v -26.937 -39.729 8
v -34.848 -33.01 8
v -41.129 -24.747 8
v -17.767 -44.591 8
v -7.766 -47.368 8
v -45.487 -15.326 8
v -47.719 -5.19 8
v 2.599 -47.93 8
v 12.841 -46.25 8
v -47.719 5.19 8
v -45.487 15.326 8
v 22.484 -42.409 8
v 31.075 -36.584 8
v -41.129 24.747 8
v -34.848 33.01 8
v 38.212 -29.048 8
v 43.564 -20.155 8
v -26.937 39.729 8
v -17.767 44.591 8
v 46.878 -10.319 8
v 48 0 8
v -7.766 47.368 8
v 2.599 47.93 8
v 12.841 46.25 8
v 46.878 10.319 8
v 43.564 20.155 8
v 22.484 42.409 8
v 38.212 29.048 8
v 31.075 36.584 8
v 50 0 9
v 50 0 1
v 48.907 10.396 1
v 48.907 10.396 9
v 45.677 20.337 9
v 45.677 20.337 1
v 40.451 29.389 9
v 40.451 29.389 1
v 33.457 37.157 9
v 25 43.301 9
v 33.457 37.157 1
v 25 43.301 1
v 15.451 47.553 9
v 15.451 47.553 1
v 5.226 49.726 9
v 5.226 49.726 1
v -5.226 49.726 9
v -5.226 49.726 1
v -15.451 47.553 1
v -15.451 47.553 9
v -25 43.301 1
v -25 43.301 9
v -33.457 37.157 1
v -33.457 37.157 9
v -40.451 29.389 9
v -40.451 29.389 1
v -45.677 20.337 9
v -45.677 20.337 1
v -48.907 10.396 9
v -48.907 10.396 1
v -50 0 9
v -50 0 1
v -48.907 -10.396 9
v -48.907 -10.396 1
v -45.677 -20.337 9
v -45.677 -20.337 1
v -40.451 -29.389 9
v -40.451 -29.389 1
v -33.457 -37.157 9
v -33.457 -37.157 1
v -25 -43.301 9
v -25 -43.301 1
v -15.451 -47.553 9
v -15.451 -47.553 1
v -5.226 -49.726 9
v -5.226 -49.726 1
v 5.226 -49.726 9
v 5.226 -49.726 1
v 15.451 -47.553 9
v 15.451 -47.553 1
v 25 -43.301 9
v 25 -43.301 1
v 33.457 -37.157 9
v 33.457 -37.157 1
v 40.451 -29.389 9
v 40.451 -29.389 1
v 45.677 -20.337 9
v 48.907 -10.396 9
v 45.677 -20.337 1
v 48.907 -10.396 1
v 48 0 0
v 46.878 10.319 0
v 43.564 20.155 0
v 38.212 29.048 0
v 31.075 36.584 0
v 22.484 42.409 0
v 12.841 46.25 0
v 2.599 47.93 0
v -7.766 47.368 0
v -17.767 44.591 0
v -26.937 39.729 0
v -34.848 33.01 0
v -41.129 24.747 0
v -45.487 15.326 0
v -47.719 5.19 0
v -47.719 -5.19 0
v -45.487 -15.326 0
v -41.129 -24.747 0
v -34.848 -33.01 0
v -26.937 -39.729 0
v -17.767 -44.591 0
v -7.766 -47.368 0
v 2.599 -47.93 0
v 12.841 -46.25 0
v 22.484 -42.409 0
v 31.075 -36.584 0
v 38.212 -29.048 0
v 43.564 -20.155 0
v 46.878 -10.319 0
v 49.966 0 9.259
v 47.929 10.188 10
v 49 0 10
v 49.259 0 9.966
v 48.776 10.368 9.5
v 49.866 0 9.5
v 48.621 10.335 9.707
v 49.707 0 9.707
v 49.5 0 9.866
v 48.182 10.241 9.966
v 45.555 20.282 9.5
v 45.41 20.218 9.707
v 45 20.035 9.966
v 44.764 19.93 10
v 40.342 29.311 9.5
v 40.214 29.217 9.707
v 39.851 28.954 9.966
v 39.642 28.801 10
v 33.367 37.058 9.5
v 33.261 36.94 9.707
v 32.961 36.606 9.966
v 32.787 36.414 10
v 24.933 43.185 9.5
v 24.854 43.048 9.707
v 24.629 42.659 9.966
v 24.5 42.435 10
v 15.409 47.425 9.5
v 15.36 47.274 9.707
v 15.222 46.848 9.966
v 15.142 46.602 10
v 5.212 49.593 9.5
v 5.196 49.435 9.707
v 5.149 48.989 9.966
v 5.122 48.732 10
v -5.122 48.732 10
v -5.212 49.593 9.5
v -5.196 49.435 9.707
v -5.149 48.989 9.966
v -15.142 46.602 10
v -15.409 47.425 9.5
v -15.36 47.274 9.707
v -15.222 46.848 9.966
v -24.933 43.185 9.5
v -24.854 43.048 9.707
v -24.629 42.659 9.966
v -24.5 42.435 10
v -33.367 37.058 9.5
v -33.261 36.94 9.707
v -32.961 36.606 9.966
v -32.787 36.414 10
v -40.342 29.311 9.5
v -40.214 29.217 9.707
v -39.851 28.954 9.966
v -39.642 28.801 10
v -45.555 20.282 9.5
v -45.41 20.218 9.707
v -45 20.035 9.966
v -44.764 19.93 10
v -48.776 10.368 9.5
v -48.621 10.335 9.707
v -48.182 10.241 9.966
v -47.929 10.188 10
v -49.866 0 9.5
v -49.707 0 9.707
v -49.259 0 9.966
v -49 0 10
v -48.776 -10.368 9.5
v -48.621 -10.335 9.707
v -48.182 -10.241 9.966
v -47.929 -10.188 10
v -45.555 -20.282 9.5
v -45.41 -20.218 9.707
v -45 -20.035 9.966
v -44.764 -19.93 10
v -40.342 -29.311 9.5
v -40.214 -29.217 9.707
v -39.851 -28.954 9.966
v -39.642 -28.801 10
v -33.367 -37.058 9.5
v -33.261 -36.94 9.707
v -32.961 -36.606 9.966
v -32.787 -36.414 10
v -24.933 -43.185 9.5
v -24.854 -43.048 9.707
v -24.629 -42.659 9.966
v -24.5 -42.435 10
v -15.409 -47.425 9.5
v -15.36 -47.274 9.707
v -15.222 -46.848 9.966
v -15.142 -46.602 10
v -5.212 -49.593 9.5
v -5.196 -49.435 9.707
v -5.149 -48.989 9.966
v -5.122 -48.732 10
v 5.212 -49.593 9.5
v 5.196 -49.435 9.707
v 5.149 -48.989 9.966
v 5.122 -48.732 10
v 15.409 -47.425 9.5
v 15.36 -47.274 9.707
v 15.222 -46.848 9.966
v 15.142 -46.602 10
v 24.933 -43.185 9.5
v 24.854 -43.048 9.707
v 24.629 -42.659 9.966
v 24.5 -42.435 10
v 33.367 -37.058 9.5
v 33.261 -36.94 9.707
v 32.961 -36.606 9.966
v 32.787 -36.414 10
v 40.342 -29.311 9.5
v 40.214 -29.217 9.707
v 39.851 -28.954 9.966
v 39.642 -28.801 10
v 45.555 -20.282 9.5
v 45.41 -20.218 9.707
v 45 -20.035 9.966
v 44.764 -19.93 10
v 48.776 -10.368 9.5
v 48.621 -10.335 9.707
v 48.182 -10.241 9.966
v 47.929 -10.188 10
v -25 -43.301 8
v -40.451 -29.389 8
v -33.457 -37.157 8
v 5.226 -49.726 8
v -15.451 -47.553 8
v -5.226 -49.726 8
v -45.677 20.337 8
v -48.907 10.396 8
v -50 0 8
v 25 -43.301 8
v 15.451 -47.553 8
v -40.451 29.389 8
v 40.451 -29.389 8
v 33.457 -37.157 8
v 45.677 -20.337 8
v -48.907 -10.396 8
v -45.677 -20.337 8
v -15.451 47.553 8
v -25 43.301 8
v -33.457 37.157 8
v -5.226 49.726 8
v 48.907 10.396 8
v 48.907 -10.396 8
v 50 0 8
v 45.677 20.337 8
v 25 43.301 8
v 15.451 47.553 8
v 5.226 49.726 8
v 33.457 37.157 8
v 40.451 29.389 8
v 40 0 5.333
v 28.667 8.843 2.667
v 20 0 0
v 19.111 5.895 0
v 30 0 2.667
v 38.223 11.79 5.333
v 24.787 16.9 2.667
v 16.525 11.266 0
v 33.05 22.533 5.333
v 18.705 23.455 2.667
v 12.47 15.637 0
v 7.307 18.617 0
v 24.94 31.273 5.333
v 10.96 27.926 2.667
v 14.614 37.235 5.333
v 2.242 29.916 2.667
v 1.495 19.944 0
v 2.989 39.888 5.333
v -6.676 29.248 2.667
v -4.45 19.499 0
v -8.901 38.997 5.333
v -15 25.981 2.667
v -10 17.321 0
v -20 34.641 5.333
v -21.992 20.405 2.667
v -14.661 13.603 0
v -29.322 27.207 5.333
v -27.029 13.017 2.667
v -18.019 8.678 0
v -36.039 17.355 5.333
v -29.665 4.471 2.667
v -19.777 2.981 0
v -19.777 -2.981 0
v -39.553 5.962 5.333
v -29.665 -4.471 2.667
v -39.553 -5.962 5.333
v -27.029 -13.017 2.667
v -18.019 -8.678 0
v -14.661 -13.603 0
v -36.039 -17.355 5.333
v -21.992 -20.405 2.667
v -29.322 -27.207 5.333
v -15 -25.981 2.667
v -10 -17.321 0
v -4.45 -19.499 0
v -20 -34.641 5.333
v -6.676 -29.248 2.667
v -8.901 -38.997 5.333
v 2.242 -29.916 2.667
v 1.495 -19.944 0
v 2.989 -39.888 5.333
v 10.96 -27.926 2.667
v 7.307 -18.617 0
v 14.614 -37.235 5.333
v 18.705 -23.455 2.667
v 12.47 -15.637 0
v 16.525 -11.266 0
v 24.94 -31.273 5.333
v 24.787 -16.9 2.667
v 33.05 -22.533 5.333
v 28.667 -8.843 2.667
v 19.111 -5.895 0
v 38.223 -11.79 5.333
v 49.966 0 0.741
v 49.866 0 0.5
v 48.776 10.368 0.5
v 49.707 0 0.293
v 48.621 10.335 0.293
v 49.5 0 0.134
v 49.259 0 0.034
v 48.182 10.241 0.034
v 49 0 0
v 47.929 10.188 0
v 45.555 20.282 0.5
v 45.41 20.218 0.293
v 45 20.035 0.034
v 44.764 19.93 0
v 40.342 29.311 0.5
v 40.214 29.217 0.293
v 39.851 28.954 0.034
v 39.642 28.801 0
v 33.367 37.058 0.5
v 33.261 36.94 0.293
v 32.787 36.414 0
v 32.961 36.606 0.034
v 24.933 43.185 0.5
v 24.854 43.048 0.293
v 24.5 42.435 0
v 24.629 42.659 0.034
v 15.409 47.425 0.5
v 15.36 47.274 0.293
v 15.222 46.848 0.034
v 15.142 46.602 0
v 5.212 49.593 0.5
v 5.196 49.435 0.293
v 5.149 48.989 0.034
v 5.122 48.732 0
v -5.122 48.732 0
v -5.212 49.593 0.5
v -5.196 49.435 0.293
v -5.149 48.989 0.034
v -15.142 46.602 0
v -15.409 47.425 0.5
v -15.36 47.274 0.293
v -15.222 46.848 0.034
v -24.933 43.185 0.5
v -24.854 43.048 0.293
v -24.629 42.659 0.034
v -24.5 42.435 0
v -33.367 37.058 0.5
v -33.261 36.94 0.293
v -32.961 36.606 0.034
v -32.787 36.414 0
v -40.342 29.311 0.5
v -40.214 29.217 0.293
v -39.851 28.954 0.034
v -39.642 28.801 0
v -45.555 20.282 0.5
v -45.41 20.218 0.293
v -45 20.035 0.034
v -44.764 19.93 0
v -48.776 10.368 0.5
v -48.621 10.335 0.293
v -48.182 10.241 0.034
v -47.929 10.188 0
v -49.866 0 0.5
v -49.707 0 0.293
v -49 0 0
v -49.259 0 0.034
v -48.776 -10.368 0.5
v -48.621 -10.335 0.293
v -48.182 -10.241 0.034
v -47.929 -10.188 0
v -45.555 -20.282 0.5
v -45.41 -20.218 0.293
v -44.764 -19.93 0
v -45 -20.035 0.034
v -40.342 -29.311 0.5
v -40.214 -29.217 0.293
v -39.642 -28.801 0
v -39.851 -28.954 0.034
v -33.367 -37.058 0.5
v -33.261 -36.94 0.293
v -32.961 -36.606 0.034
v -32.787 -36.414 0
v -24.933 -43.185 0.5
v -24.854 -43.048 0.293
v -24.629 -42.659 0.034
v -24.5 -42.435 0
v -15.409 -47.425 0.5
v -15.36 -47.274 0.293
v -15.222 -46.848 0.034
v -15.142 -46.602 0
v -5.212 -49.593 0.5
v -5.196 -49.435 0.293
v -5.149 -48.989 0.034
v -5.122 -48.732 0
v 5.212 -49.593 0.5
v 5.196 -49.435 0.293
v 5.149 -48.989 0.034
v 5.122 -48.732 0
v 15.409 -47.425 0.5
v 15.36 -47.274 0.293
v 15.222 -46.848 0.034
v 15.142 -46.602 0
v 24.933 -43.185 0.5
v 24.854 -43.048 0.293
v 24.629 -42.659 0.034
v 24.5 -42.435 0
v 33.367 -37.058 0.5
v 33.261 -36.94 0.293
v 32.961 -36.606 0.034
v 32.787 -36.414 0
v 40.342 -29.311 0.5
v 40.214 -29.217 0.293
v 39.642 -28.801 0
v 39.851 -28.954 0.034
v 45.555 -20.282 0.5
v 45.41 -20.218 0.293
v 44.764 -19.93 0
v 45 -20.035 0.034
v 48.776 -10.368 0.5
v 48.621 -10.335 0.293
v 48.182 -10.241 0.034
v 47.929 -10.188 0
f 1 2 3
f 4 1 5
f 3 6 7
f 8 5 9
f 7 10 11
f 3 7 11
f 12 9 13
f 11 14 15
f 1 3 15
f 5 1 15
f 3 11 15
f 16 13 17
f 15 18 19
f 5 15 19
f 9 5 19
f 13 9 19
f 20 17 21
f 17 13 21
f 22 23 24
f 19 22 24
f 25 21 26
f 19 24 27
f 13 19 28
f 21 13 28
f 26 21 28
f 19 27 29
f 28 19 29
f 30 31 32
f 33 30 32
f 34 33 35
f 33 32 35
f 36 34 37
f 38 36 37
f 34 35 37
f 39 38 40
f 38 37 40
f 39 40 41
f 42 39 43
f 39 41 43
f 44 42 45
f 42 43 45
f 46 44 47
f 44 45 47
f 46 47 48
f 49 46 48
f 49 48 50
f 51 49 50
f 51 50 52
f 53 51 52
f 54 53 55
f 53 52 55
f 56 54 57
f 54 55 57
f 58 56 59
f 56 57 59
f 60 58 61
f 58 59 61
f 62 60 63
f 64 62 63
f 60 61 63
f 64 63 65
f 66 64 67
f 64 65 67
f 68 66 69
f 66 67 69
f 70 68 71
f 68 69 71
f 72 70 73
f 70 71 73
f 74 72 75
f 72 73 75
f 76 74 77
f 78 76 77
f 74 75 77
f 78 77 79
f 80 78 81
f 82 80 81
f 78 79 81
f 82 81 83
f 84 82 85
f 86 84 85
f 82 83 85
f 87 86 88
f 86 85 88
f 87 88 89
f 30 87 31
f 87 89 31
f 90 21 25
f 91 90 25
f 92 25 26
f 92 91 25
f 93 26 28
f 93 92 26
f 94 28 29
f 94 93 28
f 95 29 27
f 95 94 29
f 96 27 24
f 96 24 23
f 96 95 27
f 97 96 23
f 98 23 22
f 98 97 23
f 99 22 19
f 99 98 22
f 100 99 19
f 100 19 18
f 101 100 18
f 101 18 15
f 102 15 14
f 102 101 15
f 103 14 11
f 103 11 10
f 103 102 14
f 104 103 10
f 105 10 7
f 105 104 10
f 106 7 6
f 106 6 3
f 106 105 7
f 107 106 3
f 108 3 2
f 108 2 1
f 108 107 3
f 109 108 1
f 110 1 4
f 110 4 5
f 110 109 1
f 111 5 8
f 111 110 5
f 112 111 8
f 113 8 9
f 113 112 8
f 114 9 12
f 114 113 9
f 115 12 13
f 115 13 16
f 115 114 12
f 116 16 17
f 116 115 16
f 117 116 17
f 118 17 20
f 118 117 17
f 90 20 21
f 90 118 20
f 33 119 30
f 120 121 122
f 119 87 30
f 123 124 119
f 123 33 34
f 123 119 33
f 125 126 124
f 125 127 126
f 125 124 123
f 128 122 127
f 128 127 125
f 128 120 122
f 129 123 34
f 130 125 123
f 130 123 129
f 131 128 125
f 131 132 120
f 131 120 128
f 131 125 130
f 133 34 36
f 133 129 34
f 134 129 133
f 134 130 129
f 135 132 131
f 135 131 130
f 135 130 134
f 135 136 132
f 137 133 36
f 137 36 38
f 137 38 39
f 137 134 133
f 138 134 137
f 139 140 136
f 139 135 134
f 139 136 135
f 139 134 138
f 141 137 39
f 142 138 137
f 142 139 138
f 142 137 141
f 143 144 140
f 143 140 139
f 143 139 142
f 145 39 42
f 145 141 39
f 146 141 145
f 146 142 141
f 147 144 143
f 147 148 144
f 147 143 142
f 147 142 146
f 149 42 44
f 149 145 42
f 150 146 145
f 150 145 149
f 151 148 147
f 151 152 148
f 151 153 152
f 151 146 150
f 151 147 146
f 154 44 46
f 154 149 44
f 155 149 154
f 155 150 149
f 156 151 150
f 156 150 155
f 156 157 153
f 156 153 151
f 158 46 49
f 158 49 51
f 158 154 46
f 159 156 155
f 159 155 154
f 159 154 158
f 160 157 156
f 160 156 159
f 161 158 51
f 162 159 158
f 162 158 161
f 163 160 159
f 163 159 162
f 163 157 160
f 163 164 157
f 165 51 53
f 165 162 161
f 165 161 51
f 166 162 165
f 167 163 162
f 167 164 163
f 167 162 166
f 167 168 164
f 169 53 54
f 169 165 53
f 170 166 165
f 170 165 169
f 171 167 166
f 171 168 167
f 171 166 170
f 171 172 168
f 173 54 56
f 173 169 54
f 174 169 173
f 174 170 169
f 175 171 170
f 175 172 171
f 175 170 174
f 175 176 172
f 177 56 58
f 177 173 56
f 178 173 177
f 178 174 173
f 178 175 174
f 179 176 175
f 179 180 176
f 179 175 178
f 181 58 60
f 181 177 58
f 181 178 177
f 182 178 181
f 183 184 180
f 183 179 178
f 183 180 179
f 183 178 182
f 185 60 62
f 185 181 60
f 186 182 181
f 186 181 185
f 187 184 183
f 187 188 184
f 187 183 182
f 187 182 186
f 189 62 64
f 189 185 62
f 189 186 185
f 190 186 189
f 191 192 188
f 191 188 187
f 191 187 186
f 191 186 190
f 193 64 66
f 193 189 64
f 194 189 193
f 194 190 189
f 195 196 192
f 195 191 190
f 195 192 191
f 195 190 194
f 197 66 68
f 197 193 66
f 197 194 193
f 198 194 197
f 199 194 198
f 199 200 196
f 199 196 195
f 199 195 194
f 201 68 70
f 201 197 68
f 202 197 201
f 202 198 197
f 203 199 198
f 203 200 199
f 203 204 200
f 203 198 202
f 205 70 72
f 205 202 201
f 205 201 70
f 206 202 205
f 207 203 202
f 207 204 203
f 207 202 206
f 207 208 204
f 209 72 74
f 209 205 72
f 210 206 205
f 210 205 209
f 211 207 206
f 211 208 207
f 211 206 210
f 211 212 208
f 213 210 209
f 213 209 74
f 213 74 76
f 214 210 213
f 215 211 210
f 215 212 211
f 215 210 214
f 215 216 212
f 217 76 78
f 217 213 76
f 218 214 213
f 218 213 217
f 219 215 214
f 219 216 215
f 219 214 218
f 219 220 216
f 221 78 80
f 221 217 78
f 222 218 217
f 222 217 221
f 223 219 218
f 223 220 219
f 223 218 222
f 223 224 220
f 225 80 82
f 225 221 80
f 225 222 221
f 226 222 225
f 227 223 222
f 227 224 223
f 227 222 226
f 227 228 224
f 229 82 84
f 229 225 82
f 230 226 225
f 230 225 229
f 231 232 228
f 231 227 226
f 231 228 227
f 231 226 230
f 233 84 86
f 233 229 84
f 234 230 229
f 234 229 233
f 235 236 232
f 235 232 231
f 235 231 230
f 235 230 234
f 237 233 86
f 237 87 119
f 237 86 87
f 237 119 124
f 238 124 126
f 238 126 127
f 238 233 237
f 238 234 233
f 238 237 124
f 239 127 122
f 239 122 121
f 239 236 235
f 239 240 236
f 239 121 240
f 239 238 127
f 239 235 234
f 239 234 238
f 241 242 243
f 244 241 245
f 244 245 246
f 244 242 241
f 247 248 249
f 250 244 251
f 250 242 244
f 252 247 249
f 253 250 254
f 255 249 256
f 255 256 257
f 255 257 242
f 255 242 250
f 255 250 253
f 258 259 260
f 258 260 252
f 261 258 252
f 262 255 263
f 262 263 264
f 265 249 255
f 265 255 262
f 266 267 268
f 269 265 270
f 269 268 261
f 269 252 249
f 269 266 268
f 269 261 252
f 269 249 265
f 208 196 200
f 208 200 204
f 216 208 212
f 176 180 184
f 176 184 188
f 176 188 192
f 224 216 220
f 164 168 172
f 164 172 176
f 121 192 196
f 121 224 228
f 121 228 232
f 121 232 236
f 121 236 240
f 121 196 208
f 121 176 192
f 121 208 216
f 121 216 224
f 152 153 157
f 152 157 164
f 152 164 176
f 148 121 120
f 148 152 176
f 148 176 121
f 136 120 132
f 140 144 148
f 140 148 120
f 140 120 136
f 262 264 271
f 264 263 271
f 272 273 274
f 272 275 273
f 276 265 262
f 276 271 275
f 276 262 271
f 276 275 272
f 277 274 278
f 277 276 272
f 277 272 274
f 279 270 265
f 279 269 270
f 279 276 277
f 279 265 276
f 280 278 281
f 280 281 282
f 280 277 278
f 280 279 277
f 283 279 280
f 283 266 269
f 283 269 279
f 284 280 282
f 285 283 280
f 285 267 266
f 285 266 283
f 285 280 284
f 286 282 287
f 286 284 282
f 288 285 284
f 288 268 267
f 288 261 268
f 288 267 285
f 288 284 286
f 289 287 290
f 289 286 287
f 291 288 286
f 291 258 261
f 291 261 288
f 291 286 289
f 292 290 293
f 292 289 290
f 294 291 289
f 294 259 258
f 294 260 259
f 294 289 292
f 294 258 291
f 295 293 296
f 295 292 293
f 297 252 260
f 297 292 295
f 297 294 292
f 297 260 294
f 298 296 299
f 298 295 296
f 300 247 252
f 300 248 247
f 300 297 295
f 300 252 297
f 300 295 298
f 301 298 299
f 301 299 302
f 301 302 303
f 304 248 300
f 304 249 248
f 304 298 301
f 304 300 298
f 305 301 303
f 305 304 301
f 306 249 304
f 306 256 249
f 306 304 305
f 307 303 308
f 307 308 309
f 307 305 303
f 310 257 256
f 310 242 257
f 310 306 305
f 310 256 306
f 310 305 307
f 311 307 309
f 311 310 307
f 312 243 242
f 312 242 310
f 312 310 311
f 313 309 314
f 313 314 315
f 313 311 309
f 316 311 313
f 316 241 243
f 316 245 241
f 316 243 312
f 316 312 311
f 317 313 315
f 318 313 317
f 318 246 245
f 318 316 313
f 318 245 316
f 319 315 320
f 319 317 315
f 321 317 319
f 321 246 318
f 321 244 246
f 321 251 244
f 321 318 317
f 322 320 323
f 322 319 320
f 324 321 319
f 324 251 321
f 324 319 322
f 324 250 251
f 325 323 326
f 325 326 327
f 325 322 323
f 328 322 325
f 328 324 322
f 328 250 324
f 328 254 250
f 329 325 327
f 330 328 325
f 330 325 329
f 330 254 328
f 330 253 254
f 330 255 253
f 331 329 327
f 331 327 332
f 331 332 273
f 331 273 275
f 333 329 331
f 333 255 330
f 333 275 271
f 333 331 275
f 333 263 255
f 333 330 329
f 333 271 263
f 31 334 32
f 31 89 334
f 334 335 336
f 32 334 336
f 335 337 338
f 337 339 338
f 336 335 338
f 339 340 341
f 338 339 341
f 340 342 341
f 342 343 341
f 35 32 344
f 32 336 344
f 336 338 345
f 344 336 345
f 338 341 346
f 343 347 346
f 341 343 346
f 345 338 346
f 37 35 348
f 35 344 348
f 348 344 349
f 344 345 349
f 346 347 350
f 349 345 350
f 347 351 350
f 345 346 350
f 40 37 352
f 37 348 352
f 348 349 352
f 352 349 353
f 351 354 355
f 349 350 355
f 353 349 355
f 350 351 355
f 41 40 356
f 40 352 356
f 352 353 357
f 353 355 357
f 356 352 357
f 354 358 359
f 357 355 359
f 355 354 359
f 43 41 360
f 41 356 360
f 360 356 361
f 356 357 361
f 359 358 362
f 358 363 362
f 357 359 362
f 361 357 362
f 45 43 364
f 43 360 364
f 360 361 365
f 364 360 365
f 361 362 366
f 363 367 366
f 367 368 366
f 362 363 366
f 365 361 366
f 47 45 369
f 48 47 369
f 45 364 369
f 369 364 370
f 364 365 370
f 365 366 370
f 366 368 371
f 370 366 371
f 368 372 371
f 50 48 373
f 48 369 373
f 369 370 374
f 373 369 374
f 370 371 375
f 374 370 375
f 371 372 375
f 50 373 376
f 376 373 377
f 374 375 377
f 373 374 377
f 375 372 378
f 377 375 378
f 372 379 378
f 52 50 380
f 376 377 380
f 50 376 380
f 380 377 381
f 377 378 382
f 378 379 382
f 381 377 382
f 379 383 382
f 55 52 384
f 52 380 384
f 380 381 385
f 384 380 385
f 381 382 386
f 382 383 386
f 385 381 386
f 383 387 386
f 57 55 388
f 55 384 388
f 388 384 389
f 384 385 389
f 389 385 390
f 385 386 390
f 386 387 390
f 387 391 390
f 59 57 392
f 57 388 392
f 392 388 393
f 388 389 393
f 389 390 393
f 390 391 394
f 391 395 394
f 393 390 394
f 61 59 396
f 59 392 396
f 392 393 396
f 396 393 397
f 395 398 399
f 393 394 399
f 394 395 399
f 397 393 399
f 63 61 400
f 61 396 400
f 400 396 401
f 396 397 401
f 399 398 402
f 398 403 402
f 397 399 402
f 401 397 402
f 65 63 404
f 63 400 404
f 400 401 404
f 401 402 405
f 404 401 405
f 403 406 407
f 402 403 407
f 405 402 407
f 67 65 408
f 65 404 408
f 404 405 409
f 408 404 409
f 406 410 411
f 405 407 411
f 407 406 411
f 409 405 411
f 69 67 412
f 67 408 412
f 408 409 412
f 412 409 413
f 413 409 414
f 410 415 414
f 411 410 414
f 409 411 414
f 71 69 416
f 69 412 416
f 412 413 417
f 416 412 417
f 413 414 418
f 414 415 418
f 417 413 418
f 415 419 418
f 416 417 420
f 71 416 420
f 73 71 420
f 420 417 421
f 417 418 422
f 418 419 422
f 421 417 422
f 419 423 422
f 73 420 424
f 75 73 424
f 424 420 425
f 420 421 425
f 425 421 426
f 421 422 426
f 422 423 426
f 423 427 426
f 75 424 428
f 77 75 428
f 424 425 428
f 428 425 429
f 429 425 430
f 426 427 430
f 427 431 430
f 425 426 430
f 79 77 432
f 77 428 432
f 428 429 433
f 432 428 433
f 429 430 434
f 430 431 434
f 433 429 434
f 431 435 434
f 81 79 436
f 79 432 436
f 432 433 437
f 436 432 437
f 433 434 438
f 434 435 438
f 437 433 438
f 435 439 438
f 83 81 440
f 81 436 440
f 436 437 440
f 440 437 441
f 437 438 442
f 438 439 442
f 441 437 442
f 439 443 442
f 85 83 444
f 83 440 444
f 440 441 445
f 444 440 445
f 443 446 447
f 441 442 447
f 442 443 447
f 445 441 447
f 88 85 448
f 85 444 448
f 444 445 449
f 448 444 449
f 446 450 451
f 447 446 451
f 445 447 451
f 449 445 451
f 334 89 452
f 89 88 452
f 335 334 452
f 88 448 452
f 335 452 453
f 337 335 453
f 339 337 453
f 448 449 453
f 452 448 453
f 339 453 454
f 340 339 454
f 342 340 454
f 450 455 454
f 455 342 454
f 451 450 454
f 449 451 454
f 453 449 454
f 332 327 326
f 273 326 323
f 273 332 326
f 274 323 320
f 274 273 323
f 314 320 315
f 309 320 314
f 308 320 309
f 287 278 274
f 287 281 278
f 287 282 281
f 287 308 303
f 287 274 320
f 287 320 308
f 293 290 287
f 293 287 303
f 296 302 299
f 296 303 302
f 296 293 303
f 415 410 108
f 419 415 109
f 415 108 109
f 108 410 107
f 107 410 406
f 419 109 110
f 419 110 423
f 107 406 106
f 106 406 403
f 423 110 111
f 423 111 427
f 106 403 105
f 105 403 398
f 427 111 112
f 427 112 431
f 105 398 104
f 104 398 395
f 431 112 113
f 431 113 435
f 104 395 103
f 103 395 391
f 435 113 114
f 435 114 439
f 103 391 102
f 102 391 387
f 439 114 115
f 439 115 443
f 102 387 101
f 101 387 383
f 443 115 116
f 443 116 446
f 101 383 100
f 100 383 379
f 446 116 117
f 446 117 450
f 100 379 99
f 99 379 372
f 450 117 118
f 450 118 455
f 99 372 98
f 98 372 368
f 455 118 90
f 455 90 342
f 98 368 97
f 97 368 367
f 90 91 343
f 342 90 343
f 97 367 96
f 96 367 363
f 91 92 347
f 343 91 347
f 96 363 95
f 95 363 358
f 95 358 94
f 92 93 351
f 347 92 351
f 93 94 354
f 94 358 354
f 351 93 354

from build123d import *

# Parameters (mm, degrees)
CYLINDER001_R     = 48
CYLINDER001_DEPTH = 8
CYLINDER_R        = 50
CYLINDER_DEPTH    = 10
FILLET_R          = 1


with BuildPart() as cone:
    # Cone → Cone (revolve)
    with BuildSketch(Plane.XZ):
        Polygon((0, 0), (20, 0), (50, 8), (0, 8), align=None)
    revolve(axis=Axis((0, 0, 0), (0, 0, 1)))


with BuildPart() as cylinder001:
    # Cylinder001 → Cylinder001 (new body)
    with BuildSketch(Plane.XY):
        Circle(CYLINDER001_R)
    extrude(amount=CYLINDER001_DEPTH)


with BuildPart() as fillet_body:
    # Cylinder → Cylinder (new body)
    with BuildSketch(Plane.XY):
        Circle(CYLINDER_R)
    extrude(amount=CYLINDER_DEPTH)

    # Cut: cut Cylinder001
    add(cylinder001.part, mode=Mode.SUBTRACT)

    # Fillet
    fillet_edges = [fillet_body.edges().sort_by_distance(p)[0] for p in [
        (-50, 0, 10),
        (-50, 0, 0),
    ]]
    fillet(fillet_edges, radius=FILLET_R)


solid = Compound([cone.part, fillet_body.part])
